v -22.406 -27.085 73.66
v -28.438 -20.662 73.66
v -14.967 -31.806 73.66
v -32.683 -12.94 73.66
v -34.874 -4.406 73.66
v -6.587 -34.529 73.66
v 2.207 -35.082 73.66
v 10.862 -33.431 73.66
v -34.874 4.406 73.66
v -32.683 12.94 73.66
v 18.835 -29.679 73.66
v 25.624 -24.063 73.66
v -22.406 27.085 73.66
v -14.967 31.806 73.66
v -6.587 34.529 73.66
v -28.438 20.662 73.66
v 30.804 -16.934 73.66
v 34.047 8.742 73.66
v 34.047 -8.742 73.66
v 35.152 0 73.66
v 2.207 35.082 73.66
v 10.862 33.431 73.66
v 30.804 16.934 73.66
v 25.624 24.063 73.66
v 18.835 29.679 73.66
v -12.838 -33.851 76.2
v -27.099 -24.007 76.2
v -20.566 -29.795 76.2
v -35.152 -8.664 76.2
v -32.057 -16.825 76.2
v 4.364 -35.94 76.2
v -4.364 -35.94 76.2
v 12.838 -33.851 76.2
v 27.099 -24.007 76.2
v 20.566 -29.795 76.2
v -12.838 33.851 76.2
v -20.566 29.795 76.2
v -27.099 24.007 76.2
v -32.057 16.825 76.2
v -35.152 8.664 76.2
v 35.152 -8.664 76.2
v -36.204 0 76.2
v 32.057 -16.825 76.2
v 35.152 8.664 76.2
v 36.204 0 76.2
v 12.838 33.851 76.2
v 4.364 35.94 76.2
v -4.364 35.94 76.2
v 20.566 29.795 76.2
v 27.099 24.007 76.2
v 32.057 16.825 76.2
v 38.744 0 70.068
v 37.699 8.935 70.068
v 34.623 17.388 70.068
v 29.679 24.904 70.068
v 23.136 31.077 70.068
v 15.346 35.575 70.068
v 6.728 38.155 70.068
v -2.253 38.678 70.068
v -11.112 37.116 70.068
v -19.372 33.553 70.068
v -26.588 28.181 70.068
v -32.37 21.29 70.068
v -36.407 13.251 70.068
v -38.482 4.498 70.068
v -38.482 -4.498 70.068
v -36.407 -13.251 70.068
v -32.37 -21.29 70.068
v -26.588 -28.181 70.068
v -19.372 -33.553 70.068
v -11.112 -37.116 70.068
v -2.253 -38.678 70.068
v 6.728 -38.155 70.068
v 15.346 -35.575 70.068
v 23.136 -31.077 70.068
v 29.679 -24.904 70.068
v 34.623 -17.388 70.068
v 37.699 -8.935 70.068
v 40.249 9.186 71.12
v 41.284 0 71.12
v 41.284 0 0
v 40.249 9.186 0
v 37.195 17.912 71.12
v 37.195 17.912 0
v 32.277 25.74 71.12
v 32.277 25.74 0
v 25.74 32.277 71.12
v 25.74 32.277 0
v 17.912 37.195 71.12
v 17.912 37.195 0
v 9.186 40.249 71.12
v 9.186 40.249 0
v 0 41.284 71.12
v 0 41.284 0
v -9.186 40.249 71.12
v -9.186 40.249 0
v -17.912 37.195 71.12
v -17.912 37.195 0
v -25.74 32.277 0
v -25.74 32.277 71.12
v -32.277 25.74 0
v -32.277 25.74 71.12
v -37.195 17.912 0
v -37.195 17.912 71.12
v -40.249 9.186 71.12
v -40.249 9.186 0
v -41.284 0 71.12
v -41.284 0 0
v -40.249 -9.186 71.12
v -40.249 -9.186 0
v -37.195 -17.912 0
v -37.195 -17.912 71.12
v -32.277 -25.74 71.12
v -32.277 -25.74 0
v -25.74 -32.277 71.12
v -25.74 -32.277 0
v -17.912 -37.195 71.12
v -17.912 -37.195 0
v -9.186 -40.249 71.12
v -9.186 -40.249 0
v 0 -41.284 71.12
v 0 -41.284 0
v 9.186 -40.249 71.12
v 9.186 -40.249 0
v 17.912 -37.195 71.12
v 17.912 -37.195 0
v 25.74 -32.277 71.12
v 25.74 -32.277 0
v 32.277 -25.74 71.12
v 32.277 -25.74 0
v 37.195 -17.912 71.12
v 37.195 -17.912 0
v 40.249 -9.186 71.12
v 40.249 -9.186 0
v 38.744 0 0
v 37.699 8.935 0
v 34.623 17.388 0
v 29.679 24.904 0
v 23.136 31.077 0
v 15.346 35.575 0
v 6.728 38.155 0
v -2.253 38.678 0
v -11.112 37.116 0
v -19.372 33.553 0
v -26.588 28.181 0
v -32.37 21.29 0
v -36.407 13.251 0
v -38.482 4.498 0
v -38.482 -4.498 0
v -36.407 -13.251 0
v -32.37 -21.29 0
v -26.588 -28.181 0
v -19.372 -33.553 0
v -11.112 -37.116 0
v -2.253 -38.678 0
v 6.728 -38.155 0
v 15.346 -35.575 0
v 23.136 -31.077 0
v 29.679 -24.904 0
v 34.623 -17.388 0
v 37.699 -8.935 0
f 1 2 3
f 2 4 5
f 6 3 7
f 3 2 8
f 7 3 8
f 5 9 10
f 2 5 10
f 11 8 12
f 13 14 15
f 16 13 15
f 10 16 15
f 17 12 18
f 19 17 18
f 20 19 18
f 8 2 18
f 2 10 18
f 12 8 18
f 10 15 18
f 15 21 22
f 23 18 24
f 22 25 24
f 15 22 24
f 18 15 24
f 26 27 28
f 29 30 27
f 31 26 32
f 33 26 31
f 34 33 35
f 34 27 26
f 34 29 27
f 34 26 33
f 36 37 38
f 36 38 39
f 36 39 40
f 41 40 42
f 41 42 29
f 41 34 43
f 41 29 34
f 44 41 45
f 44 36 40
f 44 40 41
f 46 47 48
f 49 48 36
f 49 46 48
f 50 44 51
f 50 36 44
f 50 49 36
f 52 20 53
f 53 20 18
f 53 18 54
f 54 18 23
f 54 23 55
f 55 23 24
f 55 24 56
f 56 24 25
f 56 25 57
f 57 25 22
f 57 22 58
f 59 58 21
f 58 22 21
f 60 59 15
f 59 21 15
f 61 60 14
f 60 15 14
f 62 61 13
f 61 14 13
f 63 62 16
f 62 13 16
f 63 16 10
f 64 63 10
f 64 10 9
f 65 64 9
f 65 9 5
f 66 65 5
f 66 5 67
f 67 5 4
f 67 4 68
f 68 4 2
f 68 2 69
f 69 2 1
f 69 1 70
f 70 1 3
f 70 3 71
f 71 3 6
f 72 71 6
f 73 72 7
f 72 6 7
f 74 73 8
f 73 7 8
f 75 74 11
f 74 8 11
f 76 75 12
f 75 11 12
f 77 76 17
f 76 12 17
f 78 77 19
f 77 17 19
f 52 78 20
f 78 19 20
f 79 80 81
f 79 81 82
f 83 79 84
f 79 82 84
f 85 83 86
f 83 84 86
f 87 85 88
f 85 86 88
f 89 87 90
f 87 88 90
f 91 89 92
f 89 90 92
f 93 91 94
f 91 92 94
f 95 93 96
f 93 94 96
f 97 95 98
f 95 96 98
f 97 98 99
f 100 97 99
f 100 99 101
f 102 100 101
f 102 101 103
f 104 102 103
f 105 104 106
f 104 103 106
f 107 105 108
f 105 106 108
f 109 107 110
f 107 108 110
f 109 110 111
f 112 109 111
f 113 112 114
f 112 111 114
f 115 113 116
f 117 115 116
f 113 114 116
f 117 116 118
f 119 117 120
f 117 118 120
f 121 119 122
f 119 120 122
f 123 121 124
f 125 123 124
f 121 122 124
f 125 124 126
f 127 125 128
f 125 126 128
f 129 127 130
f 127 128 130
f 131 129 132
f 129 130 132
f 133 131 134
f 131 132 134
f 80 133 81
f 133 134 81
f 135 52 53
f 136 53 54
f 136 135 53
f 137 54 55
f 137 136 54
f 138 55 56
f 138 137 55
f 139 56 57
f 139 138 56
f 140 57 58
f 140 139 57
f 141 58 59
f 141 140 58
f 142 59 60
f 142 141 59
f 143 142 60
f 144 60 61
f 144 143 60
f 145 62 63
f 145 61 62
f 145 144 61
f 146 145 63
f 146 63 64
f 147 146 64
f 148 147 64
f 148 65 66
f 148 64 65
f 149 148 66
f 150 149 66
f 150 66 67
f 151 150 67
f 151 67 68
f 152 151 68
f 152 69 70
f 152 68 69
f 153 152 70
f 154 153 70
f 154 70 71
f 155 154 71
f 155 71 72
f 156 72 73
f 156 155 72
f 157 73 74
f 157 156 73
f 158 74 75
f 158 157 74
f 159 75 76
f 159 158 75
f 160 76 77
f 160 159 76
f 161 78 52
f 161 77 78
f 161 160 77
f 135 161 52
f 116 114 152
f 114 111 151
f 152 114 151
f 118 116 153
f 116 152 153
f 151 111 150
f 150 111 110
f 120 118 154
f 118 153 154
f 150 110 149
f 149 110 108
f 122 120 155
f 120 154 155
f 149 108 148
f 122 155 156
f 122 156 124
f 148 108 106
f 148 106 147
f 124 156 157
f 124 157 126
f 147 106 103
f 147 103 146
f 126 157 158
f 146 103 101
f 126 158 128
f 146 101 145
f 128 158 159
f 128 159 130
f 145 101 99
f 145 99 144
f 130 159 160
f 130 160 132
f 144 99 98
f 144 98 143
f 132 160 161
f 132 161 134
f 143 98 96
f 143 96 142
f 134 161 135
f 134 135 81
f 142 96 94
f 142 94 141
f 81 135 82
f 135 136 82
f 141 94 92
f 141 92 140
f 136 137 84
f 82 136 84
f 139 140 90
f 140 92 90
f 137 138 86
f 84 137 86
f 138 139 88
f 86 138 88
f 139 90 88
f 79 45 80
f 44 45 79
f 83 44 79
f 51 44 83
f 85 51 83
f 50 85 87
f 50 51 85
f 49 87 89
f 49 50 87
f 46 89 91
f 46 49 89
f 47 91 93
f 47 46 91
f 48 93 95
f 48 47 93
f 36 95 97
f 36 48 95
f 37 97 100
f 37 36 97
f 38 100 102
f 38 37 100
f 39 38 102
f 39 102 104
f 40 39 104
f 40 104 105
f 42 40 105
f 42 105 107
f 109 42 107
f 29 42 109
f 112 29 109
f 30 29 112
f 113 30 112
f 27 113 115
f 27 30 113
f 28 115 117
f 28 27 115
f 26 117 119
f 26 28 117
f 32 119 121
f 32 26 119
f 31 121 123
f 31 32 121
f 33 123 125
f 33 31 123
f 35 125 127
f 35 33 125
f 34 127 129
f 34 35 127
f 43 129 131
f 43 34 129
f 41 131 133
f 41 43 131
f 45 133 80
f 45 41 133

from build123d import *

# Parameters (mm, degrees)
F0_R     = 41.283665
F1_DEPTH = 76.2
F2_SIZE  = 5.08
F3_T     = -2.54


with BuildPart() as f1:
    # F0 (on Top) → F1 (new body)
    with BuildSketch(Plane.XY):
        Circle(F0_R)
    extrude(amount=F1_DEPTH)

    # F2
    f2_edges = [f1.edges().sort_by_distance(p)[0] for p in [
        (-41.283665, 0, 76.2),
    ]]
    chamfer(f2_edges, length=F2_SIZE)

    # F3
    f3_openings = [f1.faces().sort_by_distance(p)[0] for p in [
        (0, 0, 0),
    ]]
    offset(amount=F3_T, openings=f3_openings)


solid = f1.part
